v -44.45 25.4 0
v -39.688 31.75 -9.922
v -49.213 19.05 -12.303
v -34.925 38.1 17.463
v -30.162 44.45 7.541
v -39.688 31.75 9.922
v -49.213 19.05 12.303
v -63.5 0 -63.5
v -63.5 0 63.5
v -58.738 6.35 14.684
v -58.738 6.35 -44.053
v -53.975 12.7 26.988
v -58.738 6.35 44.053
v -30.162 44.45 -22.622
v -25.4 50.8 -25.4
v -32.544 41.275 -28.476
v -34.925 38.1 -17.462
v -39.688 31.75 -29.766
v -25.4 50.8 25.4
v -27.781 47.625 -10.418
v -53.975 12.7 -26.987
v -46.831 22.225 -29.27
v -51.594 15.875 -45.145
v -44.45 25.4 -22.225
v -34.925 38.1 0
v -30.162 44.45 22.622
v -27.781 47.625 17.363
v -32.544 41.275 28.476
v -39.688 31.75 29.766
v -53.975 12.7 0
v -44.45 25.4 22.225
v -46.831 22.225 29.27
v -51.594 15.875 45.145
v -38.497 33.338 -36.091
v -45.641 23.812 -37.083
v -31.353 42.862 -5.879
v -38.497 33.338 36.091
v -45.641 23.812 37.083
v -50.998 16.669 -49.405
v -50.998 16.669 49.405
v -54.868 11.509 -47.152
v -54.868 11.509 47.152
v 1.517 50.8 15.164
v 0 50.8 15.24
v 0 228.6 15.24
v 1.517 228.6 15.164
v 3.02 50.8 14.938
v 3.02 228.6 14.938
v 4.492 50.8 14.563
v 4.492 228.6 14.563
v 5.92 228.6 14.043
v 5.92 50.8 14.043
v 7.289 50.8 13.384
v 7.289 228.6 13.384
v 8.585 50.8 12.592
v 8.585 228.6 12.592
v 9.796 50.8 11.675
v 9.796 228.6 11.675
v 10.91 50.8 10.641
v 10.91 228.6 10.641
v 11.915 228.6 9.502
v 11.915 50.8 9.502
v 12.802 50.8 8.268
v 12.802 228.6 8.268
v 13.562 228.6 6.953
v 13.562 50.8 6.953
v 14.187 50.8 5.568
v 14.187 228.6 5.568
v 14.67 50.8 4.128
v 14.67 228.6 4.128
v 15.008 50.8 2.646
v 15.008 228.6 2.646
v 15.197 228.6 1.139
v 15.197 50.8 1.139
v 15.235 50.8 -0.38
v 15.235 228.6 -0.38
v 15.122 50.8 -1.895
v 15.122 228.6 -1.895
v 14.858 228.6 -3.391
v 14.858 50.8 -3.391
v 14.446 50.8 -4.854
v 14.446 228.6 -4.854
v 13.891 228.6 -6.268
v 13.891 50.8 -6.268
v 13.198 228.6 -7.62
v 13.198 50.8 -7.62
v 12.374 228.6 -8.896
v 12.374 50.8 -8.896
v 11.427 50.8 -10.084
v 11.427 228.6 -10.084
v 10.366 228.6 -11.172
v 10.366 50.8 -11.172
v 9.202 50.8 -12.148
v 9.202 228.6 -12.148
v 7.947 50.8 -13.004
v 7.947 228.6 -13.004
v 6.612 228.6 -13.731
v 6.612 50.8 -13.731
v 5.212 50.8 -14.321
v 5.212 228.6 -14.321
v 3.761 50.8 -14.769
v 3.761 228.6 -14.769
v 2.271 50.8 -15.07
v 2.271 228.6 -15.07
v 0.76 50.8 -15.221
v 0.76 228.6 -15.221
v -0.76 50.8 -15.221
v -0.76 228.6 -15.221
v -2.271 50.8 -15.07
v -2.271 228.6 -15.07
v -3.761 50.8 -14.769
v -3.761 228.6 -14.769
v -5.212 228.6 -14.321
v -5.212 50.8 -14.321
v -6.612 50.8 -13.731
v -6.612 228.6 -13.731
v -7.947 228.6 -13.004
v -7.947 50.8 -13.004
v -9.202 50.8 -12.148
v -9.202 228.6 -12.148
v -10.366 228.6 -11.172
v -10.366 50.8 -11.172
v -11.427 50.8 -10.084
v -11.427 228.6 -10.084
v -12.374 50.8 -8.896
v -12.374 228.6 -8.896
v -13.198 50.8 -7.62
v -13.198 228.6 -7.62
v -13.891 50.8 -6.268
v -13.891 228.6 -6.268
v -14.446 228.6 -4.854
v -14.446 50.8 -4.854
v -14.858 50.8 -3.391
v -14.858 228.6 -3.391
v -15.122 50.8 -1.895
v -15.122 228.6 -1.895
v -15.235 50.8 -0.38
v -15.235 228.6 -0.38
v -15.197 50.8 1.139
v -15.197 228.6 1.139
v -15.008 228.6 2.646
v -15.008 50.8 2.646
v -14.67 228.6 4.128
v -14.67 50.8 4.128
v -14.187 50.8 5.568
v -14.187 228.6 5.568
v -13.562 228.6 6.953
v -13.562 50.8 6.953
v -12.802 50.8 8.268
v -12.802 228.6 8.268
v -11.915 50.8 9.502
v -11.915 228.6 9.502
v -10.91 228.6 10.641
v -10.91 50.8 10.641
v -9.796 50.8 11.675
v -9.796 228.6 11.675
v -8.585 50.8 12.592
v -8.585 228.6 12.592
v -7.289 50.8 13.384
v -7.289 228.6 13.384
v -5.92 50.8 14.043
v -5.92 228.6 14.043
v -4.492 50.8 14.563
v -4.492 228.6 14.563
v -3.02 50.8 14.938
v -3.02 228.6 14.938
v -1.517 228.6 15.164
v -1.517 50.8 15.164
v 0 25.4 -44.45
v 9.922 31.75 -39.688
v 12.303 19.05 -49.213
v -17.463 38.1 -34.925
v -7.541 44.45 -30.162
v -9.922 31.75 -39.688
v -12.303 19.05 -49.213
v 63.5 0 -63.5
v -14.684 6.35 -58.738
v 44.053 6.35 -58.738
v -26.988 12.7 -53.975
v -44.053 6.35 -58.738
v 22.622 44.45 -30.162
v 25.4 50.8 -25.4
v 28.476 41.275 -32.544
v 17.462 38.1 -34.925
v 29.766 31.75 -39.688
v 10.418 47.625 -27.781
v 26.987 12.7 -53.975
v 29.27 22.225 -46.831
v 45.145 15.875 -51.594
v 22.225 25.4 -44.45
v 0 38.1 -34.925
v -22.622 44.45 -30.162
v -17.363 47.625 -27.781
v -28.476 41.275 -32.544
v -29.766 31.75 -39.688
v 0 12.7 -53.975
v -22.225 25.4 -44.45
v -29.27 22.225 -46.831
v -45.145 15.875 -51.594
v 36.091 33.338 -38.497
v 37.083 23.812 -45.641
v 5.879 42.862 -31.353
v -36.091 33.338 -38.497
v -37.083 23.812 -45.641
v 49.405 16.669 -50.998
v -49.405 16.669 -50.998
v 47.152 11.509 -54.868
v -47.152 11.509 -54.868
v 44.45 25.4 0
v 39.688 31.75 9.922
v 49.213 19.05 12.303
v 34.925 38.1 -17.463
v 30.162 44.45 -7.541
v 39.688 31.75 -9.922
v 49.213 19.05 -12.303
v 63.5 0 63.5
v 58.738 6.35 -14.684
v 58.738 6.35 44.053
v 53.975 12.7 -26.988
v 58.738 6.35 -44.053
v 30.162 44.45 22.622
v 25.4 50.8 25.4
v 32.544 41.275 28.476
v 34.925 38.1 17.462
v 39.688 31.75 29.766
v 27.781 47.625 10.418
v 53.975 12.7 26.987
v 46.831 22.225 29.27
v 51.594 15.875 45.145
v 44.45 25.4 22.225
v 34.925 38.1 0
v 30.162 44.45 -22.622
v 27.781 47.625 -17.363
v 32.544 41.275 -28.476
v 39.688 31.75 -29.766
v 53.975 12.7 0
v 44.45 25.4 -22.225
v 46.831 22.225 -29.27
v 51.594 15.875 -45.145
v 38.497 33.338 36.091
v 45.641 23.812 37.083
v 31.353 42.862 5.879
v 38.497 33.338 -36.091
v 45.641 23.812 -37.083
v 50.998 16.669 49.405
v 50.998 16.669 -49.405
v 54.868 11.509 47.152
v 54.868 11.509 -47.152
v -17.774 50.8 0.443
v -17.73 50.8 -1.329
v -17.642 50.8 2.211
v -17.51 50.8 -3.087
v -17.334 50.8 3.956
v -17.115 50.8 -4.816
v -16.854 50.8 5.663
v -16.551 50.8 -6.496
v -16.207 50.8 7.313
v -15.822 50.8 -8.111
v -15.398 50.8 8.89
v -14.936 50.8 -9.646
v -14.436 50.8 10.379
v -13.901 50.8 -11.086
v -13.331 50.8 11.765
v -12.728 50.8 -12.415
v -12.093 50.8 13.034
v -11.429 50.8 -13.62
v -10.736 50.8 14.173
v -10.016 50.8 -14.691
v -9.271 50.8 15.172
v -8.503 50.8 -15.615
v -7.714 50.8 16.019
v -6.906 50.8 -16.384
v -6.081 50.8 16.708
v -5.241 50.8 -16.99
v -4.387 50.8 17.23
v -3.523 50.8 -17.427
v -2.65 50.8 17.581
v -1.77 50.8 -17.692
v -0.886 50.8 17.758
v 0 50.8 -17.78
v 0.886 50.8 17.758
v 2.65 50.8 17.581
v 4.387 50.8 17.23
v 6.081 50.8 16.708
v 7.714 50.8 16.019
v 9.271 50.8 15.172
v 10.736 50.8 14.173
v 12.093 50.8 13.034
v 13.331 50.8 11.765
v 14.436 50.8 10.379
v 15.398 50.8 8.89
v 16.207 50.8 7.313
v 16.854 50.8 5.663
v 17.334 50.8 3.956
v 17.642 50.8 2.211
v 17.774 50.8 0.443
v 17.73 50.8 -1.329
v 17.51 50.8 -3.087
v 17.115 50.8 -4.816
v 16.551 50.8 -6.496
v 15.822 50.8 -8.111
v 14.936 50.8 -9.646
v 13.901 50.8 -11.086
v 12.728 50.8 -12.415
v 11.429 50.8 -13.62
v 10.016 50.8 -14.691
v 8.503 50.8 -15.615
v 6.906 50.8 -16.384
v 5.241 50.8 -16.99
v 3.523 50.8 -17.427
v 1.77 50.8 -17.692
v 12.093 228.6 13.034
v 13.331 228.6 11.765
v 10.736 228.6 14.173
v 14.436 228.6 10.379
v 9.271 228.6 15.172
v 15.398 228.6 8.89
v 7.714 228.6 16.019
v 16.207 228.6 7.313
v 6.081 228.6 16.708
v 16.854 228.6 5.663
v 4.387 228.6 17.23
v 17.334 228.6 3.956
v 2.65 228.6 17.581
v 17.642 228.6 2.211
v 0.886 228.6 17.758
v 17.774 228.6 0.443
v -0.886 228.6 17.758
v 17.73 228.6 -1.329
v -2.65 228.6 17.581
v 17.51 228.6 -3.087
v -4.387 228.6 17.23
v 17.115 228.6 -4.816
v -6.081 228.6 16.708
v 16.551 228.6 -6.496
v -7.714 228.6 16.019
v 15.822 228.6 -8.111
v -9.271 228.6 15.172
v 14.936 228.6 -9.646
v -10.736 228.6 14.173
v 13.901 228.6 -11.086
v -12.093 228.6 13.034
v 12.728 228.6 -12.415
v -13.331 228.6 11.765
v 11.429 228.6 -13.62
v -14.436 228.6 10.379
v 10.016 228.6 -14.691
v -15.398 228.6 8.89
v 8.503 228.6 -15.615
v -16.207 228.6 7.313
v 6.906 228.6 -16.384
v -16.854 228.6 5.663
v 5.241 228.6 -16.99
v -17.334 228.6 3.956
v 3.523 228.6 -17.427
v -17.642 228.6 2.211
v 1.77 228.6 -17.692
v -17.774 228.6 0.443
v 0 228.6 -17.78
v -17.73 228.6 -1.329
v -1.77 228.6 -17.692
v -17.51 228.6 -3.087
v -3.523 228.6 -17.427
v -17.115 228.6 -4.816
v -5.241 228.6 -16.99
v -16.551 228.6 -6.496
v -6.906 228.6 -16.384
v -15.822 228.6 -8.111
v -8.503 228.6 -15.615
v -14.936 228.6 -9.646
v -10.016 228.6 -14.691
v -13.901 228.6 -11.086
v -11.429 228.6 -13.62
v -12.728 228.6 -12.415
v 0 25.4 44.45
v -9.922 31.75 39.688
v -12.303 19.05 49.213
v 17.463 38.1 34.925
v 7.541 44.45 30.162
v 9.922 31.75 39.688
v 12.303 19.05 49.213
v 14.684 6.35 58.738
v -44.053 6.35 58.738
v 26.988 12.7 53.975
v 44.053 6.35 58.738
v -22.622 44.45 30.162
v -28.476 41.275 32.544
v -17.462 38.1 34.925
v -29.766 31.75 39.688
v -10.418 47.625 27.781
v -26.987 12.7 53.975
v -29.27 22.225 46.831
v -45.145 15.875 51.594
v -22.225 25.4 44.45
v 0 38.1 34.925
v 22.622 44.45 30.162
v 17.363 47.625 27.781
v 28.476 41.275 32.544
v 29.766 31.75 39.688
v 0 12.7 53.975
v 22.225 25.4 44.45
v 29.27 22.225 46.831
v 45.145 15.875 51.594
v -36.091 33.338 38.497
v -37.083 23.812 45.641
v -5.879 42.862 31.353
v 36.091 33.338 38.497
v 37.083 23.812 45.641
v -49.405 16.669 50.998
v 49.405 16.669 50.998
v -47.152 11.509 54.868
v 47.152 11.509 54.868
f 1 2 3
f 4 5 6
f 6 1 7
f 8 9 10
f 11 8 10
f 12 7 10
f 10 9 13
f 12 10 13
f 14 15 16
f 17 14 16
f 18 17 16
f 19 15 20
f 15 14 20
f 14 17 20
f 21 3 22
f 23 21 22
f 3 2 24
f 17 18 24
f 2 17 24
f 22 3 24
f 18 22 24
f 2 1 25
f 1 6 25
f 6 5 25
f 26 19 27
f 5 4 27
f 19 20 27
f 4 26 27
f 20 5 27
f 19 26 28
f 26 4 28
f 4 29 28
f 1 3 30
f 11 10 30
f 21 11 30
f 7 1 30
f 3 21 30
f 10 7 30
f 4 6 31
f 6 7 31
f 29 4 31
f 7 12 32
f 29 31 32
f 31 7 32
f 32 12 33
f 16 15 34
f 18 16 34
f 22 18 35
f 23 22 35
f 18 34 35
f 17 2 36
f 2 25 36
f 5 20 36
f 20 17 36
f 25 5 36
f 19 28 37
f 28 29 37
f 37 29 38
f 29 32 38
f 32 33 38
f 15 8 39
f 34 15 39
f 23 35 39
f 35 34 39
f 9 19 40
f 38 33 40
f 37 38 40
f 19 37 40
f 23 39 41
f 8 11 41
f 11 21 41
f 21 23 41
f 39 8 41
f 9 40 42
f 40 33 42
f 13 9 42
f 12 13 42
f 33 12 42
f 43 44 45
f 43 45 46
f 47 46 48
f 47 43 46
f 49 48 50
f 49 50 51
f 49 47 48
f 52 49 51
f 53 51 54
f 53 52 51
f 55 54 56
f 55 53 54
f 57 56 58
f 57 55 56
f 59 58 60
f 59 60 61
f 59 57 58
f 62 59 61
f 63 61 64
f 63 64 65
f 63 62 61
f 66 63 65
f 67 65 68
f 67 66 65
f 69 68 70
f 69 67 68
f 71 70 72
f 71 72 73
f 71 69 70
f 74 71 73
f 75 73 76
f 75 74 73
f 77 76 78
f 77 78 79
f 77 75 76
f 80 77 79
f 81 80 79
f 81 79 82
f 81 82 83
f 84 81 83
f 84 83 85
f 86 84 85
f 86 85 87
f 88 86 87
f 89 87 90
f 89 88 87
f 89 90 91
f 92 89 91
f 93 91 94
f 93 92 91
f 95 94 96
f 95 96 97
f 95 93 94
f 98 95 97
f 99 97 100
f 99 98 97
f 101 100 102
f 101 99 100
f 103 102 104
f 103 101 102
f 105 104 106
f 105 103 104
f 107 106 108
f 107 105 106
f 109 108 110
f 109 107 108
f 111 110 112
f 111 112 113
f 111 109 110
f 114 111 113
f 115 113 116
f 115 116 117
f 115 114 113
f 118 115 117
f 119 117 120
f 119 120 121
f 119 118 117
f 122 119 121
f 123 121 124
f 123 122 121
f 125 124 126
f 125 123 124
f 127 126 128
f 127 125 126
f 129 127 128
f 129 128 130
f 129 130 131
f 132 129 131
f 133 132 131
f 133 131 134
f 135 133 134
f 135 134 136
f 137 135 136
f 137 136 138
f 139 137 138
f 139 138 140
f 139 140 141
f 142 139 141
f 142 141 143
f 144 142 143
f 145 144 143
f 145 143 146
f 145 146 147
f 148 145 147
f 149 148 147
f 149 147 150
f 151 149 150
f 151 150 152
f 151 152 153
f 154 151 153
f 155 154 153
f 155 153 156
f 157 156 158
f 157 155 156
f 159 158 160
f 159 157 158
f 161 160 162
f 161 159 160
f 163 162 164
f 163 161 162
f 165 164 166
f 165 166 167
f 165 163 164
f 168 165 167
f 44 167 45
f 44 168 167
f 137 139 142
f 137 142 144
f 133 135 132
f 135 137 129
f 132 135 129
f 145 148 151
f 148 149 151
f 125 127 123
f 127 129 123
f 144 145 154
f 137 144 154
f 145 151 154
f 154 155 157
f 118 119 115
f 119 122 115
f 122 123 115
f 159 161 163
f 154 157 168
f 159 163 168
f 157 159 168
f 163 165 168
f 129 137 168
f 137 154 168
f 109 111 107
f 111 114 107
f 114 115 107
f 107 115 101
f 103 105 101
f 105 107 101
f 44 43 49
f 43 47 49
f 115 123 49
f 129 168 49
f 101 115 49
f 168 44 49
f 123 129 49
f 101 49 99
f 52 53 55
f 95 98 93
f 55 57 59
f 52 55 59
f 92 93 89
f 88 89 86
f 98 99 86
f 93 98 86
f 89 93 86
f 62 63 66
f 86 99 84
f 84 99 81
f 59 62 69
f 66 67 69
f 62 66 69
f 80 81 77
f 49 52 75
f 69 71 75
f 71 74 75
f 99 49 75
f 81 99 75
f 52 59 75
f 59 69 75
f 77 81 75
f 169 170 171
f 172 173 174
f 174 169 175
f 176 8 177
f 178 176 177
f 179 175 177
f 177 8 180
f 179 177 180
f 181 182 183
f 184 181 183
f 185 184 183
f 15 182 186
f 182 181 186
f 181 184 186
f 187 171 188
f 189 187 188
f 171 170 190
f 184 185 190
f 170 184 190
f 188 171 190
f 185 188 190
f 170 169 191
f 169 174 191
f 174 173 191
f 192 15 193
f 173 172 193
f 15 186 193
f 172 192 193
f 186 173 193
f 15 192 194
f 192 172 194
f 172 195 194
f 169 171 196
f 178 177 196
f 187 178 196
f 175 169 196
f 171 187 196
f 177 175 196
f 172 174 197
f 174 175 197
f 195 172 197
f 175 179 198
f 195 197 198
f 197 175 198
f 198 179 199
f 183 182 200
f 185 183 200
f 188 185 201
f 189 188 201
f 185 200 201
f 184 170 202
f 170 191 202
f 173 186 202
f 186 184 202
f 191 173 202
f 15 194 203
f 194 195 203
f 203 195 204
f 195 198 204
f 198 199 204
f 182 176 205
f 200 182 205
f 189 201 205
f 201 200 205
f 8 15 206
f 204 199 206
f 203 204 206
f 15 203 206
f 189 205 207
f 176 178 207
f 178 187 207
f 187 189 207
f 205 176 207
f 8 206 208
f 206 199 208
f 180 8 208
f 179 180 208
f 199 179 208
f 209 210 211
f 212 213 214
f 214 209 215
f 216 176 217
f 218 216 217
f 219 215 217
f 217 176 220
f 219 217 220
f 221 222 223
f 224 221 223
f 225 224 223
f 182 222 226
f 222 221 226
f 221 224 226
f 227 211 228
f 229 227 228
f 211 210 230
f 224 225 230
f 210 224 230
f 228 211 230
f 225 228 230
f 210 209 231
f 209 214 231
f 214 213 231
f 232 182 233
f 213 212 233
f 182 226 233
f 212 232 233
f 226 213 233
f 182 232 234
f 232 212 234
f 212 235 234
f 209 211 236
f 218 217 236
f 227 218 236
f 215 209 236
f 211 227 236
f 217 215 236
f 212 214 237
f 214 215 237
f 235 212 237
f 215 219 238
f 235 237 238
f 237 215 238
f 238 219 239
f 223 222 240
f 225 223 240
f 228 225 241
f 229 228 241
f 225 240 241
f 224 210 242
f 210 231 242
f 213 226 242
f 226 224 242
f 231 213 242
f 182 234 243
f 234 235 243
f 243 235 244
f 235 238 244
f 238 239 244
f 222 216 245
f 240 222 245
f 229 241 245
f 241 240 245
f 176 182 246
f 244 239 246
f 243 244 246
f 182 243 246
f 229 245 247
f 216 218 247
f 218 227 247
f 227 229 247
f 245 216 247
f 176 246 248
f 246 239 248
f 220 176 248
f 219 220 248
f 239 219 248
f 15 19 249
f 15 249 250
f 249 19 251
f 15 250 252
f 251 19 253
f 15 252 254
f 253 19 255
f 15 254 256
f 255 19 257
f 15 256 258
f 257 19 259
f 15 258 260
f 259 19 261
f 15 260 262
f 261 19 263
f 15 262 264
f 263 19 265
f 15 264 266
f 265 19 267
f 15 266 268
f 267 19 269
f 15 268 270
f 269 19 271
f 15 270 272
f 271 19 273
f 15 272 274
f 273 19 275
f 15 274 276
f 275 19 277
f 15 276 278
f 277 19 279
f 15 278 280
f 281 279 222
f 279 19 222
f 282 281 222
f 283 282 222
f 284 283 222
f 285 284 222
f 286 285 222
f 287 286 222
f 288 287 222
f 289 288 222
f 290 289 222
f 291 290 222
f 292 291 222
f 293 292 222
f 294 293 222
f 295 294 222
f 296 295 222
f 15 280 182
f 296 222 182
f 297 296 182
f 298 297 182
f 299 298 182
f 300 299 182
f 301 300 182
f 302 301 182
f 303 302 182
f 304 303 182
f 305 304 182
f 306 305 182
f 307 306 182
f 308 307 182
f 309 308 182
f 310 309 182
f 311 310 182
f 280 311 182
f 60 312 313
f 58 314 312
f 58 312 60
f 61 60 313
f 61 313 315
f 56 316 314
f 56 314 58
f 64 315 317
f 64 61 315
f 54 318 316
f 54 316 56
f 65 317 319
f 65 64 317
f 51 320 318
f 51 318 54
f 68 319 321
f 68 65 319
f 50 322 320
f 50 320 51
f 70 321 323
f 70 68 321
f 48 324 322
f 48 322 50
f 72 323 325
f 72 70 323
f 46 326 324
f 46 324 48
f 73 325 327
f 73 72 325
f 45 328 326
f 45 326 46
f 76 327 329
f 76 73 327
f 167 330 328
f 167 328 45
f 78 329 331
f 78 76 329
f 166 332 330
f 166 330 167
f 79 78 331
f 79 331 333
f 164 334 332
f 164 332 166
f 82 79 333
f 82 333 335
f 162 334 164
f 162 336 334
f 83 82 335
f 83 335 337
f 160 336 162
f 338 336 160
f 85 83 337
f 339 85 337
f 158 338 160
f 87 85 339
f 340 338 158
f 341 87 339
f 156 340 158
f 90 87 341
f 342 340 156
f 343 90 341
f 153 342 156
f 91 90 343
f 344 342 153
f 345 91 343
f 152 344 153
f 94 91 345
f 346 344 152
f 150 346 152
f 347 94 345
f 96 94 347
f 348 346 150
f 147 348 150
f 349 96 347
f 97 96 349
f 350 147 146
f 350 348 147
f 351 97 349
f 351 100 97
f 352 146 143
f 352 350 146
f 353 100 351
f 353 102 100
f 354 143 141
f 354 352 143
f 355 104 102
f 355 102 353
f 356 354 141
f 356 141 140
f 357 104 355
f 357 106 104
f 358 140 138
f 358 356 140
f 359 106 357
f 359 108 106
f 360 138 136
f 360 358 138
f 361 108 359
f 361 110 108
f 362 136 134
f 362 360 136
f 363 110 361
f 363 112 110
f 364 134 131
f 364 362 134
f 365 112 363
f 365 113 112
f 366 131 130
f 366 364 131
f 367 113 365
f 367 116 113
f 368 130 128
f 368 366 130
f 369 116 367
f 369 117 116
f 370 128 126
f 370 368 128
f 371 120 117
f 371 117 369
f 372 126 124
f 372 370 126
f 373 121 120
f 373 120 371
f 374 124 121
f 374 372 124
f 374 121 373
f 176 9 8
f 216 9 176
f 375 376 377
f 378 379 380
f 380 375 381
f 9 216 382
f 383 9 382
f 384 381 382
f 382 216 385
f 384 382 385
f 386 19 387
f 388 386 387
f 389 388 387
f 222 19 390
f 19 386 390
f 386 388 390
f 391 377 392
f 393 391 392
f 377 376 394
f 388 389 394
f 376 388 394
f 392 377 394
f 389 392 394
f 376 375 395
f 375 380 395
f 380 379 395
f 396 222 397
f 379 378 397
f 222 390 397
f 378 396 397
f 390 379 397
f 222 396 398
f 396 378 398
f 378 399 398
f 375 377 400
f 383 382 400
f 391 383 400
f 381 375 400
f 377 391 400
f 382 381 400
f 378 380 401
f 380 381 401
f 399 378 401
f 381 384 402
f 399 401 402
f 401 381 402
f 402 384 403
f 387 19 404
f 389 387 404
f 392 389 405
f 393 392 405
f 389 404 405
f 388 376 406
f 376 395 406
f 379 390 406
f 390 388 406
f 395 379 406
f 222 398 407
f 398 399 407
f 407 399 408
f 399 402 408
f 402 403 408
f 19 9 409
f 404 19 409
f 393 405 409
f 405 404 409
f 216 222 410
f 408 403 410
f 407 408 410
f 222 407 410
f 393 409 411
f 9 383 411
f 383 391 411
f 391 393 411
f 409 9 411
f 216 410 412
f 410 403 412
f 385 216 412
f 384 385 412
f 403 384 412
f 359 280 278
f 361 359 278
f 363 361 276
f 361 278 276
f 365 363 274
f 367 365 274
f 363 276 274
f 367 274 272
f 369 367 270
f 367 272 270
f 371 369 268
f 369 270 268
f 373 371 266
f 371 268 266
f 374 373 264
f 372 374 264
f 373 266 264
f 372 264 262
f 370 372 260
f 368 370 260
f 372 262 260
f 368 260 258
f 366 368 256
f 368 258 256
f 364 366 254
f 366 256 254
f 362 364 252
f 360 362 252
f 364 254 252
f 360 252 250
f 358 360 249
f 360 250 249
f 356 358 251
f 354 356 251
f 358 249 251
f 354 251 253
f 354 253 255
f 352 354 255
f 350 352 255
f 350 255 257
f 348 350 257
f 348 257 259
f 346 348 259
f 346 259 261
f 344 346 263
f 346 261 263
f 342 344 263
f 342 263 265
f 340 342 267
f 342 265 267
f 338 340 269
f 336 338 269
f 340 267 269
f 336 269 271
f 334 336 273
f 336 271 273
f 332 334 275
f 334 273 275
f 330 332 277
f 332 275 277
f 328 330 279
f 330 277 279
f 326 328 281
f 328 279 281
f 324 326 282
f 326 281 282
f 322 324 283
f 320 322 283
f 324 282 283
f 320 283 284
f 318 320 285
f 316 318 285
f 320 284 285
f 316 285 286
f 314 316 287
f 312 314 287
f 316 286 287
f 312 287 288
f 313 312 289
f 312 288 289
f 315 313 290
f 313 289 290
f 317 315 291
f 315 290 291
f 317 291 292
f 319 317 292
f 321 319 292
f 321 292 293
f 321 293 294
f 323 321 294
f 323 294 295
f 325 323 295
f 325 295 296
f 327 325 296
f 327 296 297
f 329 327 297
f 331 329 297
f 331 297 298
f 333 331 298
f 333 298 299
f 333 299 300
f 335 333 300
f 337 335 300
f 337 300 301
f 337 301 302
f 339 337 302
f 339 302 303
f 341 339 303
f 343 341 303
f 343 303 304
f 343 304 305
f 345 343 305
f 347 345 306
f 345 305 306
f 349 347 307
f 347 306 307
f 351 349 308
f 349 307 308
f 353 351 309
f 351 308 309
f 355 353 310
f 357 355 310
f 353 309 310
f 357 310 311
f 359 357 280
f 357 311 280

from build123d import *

# Parameters (mm, degrees)
SKETCH3_R           = 17.78
SKETCH3_R_2         = 15.24
BOSS_EXTRUDE1_DEPTH = 177.8


with BuildPart() as part:
    # Sketch2 → Loft1 section 0
    with BuildSketch(Plane(origin=(0, 50.8, 0), x_dir=(1, 0, 0), z_dir=(0, 1, 0))):
        with BuildLine():
            Line((-25.4, -25.4), (25.4, -25.4))
            Line((25.4, -25.4), (25.4, 25.4))
            Line((25.4, 25.4), (-25.4, 25.4))
            Line((-25.4, 25.4), (-25.4, -25.4))
        make_face()
    # Sketch1 → Loft1 section 1
    with BuildSketch(Plane(origin=(0, 0, 0), x_dir=(1, 0, 0), z_dir=(0, 1, 0))):
        with BuildLine():
            Line((-63.5, -63.5), (63.5, -63.5))
            Line((63.5, -63.5), (63.5, 63.5))
            Line((63.5, 63.5), (-63.5, 63.5))
            Line((-63.5, 63.5), (-63.5, -63.5))
        make_face()
    loft()

    # Sketch3 → Boss-Extrude1 (add)
    with BuildSketch(Plane(origin=(0, 50.8, 0), x_dir=(1, 0, 0), z_dir=(0, 1, 0))):
        with Locations(Location((0, 0, 0), (0, 0, 90))):
            Circle(SKETCH3_R)
        with Locations(Location((0, 0, 0), (0, 0, 270))):
            Circle(SKETCH3_R_2, mode=Mode.SUBTRACT)
    extrude(amount=BOSS_EXTRUDE1_DEPTH)


solid = part.part
